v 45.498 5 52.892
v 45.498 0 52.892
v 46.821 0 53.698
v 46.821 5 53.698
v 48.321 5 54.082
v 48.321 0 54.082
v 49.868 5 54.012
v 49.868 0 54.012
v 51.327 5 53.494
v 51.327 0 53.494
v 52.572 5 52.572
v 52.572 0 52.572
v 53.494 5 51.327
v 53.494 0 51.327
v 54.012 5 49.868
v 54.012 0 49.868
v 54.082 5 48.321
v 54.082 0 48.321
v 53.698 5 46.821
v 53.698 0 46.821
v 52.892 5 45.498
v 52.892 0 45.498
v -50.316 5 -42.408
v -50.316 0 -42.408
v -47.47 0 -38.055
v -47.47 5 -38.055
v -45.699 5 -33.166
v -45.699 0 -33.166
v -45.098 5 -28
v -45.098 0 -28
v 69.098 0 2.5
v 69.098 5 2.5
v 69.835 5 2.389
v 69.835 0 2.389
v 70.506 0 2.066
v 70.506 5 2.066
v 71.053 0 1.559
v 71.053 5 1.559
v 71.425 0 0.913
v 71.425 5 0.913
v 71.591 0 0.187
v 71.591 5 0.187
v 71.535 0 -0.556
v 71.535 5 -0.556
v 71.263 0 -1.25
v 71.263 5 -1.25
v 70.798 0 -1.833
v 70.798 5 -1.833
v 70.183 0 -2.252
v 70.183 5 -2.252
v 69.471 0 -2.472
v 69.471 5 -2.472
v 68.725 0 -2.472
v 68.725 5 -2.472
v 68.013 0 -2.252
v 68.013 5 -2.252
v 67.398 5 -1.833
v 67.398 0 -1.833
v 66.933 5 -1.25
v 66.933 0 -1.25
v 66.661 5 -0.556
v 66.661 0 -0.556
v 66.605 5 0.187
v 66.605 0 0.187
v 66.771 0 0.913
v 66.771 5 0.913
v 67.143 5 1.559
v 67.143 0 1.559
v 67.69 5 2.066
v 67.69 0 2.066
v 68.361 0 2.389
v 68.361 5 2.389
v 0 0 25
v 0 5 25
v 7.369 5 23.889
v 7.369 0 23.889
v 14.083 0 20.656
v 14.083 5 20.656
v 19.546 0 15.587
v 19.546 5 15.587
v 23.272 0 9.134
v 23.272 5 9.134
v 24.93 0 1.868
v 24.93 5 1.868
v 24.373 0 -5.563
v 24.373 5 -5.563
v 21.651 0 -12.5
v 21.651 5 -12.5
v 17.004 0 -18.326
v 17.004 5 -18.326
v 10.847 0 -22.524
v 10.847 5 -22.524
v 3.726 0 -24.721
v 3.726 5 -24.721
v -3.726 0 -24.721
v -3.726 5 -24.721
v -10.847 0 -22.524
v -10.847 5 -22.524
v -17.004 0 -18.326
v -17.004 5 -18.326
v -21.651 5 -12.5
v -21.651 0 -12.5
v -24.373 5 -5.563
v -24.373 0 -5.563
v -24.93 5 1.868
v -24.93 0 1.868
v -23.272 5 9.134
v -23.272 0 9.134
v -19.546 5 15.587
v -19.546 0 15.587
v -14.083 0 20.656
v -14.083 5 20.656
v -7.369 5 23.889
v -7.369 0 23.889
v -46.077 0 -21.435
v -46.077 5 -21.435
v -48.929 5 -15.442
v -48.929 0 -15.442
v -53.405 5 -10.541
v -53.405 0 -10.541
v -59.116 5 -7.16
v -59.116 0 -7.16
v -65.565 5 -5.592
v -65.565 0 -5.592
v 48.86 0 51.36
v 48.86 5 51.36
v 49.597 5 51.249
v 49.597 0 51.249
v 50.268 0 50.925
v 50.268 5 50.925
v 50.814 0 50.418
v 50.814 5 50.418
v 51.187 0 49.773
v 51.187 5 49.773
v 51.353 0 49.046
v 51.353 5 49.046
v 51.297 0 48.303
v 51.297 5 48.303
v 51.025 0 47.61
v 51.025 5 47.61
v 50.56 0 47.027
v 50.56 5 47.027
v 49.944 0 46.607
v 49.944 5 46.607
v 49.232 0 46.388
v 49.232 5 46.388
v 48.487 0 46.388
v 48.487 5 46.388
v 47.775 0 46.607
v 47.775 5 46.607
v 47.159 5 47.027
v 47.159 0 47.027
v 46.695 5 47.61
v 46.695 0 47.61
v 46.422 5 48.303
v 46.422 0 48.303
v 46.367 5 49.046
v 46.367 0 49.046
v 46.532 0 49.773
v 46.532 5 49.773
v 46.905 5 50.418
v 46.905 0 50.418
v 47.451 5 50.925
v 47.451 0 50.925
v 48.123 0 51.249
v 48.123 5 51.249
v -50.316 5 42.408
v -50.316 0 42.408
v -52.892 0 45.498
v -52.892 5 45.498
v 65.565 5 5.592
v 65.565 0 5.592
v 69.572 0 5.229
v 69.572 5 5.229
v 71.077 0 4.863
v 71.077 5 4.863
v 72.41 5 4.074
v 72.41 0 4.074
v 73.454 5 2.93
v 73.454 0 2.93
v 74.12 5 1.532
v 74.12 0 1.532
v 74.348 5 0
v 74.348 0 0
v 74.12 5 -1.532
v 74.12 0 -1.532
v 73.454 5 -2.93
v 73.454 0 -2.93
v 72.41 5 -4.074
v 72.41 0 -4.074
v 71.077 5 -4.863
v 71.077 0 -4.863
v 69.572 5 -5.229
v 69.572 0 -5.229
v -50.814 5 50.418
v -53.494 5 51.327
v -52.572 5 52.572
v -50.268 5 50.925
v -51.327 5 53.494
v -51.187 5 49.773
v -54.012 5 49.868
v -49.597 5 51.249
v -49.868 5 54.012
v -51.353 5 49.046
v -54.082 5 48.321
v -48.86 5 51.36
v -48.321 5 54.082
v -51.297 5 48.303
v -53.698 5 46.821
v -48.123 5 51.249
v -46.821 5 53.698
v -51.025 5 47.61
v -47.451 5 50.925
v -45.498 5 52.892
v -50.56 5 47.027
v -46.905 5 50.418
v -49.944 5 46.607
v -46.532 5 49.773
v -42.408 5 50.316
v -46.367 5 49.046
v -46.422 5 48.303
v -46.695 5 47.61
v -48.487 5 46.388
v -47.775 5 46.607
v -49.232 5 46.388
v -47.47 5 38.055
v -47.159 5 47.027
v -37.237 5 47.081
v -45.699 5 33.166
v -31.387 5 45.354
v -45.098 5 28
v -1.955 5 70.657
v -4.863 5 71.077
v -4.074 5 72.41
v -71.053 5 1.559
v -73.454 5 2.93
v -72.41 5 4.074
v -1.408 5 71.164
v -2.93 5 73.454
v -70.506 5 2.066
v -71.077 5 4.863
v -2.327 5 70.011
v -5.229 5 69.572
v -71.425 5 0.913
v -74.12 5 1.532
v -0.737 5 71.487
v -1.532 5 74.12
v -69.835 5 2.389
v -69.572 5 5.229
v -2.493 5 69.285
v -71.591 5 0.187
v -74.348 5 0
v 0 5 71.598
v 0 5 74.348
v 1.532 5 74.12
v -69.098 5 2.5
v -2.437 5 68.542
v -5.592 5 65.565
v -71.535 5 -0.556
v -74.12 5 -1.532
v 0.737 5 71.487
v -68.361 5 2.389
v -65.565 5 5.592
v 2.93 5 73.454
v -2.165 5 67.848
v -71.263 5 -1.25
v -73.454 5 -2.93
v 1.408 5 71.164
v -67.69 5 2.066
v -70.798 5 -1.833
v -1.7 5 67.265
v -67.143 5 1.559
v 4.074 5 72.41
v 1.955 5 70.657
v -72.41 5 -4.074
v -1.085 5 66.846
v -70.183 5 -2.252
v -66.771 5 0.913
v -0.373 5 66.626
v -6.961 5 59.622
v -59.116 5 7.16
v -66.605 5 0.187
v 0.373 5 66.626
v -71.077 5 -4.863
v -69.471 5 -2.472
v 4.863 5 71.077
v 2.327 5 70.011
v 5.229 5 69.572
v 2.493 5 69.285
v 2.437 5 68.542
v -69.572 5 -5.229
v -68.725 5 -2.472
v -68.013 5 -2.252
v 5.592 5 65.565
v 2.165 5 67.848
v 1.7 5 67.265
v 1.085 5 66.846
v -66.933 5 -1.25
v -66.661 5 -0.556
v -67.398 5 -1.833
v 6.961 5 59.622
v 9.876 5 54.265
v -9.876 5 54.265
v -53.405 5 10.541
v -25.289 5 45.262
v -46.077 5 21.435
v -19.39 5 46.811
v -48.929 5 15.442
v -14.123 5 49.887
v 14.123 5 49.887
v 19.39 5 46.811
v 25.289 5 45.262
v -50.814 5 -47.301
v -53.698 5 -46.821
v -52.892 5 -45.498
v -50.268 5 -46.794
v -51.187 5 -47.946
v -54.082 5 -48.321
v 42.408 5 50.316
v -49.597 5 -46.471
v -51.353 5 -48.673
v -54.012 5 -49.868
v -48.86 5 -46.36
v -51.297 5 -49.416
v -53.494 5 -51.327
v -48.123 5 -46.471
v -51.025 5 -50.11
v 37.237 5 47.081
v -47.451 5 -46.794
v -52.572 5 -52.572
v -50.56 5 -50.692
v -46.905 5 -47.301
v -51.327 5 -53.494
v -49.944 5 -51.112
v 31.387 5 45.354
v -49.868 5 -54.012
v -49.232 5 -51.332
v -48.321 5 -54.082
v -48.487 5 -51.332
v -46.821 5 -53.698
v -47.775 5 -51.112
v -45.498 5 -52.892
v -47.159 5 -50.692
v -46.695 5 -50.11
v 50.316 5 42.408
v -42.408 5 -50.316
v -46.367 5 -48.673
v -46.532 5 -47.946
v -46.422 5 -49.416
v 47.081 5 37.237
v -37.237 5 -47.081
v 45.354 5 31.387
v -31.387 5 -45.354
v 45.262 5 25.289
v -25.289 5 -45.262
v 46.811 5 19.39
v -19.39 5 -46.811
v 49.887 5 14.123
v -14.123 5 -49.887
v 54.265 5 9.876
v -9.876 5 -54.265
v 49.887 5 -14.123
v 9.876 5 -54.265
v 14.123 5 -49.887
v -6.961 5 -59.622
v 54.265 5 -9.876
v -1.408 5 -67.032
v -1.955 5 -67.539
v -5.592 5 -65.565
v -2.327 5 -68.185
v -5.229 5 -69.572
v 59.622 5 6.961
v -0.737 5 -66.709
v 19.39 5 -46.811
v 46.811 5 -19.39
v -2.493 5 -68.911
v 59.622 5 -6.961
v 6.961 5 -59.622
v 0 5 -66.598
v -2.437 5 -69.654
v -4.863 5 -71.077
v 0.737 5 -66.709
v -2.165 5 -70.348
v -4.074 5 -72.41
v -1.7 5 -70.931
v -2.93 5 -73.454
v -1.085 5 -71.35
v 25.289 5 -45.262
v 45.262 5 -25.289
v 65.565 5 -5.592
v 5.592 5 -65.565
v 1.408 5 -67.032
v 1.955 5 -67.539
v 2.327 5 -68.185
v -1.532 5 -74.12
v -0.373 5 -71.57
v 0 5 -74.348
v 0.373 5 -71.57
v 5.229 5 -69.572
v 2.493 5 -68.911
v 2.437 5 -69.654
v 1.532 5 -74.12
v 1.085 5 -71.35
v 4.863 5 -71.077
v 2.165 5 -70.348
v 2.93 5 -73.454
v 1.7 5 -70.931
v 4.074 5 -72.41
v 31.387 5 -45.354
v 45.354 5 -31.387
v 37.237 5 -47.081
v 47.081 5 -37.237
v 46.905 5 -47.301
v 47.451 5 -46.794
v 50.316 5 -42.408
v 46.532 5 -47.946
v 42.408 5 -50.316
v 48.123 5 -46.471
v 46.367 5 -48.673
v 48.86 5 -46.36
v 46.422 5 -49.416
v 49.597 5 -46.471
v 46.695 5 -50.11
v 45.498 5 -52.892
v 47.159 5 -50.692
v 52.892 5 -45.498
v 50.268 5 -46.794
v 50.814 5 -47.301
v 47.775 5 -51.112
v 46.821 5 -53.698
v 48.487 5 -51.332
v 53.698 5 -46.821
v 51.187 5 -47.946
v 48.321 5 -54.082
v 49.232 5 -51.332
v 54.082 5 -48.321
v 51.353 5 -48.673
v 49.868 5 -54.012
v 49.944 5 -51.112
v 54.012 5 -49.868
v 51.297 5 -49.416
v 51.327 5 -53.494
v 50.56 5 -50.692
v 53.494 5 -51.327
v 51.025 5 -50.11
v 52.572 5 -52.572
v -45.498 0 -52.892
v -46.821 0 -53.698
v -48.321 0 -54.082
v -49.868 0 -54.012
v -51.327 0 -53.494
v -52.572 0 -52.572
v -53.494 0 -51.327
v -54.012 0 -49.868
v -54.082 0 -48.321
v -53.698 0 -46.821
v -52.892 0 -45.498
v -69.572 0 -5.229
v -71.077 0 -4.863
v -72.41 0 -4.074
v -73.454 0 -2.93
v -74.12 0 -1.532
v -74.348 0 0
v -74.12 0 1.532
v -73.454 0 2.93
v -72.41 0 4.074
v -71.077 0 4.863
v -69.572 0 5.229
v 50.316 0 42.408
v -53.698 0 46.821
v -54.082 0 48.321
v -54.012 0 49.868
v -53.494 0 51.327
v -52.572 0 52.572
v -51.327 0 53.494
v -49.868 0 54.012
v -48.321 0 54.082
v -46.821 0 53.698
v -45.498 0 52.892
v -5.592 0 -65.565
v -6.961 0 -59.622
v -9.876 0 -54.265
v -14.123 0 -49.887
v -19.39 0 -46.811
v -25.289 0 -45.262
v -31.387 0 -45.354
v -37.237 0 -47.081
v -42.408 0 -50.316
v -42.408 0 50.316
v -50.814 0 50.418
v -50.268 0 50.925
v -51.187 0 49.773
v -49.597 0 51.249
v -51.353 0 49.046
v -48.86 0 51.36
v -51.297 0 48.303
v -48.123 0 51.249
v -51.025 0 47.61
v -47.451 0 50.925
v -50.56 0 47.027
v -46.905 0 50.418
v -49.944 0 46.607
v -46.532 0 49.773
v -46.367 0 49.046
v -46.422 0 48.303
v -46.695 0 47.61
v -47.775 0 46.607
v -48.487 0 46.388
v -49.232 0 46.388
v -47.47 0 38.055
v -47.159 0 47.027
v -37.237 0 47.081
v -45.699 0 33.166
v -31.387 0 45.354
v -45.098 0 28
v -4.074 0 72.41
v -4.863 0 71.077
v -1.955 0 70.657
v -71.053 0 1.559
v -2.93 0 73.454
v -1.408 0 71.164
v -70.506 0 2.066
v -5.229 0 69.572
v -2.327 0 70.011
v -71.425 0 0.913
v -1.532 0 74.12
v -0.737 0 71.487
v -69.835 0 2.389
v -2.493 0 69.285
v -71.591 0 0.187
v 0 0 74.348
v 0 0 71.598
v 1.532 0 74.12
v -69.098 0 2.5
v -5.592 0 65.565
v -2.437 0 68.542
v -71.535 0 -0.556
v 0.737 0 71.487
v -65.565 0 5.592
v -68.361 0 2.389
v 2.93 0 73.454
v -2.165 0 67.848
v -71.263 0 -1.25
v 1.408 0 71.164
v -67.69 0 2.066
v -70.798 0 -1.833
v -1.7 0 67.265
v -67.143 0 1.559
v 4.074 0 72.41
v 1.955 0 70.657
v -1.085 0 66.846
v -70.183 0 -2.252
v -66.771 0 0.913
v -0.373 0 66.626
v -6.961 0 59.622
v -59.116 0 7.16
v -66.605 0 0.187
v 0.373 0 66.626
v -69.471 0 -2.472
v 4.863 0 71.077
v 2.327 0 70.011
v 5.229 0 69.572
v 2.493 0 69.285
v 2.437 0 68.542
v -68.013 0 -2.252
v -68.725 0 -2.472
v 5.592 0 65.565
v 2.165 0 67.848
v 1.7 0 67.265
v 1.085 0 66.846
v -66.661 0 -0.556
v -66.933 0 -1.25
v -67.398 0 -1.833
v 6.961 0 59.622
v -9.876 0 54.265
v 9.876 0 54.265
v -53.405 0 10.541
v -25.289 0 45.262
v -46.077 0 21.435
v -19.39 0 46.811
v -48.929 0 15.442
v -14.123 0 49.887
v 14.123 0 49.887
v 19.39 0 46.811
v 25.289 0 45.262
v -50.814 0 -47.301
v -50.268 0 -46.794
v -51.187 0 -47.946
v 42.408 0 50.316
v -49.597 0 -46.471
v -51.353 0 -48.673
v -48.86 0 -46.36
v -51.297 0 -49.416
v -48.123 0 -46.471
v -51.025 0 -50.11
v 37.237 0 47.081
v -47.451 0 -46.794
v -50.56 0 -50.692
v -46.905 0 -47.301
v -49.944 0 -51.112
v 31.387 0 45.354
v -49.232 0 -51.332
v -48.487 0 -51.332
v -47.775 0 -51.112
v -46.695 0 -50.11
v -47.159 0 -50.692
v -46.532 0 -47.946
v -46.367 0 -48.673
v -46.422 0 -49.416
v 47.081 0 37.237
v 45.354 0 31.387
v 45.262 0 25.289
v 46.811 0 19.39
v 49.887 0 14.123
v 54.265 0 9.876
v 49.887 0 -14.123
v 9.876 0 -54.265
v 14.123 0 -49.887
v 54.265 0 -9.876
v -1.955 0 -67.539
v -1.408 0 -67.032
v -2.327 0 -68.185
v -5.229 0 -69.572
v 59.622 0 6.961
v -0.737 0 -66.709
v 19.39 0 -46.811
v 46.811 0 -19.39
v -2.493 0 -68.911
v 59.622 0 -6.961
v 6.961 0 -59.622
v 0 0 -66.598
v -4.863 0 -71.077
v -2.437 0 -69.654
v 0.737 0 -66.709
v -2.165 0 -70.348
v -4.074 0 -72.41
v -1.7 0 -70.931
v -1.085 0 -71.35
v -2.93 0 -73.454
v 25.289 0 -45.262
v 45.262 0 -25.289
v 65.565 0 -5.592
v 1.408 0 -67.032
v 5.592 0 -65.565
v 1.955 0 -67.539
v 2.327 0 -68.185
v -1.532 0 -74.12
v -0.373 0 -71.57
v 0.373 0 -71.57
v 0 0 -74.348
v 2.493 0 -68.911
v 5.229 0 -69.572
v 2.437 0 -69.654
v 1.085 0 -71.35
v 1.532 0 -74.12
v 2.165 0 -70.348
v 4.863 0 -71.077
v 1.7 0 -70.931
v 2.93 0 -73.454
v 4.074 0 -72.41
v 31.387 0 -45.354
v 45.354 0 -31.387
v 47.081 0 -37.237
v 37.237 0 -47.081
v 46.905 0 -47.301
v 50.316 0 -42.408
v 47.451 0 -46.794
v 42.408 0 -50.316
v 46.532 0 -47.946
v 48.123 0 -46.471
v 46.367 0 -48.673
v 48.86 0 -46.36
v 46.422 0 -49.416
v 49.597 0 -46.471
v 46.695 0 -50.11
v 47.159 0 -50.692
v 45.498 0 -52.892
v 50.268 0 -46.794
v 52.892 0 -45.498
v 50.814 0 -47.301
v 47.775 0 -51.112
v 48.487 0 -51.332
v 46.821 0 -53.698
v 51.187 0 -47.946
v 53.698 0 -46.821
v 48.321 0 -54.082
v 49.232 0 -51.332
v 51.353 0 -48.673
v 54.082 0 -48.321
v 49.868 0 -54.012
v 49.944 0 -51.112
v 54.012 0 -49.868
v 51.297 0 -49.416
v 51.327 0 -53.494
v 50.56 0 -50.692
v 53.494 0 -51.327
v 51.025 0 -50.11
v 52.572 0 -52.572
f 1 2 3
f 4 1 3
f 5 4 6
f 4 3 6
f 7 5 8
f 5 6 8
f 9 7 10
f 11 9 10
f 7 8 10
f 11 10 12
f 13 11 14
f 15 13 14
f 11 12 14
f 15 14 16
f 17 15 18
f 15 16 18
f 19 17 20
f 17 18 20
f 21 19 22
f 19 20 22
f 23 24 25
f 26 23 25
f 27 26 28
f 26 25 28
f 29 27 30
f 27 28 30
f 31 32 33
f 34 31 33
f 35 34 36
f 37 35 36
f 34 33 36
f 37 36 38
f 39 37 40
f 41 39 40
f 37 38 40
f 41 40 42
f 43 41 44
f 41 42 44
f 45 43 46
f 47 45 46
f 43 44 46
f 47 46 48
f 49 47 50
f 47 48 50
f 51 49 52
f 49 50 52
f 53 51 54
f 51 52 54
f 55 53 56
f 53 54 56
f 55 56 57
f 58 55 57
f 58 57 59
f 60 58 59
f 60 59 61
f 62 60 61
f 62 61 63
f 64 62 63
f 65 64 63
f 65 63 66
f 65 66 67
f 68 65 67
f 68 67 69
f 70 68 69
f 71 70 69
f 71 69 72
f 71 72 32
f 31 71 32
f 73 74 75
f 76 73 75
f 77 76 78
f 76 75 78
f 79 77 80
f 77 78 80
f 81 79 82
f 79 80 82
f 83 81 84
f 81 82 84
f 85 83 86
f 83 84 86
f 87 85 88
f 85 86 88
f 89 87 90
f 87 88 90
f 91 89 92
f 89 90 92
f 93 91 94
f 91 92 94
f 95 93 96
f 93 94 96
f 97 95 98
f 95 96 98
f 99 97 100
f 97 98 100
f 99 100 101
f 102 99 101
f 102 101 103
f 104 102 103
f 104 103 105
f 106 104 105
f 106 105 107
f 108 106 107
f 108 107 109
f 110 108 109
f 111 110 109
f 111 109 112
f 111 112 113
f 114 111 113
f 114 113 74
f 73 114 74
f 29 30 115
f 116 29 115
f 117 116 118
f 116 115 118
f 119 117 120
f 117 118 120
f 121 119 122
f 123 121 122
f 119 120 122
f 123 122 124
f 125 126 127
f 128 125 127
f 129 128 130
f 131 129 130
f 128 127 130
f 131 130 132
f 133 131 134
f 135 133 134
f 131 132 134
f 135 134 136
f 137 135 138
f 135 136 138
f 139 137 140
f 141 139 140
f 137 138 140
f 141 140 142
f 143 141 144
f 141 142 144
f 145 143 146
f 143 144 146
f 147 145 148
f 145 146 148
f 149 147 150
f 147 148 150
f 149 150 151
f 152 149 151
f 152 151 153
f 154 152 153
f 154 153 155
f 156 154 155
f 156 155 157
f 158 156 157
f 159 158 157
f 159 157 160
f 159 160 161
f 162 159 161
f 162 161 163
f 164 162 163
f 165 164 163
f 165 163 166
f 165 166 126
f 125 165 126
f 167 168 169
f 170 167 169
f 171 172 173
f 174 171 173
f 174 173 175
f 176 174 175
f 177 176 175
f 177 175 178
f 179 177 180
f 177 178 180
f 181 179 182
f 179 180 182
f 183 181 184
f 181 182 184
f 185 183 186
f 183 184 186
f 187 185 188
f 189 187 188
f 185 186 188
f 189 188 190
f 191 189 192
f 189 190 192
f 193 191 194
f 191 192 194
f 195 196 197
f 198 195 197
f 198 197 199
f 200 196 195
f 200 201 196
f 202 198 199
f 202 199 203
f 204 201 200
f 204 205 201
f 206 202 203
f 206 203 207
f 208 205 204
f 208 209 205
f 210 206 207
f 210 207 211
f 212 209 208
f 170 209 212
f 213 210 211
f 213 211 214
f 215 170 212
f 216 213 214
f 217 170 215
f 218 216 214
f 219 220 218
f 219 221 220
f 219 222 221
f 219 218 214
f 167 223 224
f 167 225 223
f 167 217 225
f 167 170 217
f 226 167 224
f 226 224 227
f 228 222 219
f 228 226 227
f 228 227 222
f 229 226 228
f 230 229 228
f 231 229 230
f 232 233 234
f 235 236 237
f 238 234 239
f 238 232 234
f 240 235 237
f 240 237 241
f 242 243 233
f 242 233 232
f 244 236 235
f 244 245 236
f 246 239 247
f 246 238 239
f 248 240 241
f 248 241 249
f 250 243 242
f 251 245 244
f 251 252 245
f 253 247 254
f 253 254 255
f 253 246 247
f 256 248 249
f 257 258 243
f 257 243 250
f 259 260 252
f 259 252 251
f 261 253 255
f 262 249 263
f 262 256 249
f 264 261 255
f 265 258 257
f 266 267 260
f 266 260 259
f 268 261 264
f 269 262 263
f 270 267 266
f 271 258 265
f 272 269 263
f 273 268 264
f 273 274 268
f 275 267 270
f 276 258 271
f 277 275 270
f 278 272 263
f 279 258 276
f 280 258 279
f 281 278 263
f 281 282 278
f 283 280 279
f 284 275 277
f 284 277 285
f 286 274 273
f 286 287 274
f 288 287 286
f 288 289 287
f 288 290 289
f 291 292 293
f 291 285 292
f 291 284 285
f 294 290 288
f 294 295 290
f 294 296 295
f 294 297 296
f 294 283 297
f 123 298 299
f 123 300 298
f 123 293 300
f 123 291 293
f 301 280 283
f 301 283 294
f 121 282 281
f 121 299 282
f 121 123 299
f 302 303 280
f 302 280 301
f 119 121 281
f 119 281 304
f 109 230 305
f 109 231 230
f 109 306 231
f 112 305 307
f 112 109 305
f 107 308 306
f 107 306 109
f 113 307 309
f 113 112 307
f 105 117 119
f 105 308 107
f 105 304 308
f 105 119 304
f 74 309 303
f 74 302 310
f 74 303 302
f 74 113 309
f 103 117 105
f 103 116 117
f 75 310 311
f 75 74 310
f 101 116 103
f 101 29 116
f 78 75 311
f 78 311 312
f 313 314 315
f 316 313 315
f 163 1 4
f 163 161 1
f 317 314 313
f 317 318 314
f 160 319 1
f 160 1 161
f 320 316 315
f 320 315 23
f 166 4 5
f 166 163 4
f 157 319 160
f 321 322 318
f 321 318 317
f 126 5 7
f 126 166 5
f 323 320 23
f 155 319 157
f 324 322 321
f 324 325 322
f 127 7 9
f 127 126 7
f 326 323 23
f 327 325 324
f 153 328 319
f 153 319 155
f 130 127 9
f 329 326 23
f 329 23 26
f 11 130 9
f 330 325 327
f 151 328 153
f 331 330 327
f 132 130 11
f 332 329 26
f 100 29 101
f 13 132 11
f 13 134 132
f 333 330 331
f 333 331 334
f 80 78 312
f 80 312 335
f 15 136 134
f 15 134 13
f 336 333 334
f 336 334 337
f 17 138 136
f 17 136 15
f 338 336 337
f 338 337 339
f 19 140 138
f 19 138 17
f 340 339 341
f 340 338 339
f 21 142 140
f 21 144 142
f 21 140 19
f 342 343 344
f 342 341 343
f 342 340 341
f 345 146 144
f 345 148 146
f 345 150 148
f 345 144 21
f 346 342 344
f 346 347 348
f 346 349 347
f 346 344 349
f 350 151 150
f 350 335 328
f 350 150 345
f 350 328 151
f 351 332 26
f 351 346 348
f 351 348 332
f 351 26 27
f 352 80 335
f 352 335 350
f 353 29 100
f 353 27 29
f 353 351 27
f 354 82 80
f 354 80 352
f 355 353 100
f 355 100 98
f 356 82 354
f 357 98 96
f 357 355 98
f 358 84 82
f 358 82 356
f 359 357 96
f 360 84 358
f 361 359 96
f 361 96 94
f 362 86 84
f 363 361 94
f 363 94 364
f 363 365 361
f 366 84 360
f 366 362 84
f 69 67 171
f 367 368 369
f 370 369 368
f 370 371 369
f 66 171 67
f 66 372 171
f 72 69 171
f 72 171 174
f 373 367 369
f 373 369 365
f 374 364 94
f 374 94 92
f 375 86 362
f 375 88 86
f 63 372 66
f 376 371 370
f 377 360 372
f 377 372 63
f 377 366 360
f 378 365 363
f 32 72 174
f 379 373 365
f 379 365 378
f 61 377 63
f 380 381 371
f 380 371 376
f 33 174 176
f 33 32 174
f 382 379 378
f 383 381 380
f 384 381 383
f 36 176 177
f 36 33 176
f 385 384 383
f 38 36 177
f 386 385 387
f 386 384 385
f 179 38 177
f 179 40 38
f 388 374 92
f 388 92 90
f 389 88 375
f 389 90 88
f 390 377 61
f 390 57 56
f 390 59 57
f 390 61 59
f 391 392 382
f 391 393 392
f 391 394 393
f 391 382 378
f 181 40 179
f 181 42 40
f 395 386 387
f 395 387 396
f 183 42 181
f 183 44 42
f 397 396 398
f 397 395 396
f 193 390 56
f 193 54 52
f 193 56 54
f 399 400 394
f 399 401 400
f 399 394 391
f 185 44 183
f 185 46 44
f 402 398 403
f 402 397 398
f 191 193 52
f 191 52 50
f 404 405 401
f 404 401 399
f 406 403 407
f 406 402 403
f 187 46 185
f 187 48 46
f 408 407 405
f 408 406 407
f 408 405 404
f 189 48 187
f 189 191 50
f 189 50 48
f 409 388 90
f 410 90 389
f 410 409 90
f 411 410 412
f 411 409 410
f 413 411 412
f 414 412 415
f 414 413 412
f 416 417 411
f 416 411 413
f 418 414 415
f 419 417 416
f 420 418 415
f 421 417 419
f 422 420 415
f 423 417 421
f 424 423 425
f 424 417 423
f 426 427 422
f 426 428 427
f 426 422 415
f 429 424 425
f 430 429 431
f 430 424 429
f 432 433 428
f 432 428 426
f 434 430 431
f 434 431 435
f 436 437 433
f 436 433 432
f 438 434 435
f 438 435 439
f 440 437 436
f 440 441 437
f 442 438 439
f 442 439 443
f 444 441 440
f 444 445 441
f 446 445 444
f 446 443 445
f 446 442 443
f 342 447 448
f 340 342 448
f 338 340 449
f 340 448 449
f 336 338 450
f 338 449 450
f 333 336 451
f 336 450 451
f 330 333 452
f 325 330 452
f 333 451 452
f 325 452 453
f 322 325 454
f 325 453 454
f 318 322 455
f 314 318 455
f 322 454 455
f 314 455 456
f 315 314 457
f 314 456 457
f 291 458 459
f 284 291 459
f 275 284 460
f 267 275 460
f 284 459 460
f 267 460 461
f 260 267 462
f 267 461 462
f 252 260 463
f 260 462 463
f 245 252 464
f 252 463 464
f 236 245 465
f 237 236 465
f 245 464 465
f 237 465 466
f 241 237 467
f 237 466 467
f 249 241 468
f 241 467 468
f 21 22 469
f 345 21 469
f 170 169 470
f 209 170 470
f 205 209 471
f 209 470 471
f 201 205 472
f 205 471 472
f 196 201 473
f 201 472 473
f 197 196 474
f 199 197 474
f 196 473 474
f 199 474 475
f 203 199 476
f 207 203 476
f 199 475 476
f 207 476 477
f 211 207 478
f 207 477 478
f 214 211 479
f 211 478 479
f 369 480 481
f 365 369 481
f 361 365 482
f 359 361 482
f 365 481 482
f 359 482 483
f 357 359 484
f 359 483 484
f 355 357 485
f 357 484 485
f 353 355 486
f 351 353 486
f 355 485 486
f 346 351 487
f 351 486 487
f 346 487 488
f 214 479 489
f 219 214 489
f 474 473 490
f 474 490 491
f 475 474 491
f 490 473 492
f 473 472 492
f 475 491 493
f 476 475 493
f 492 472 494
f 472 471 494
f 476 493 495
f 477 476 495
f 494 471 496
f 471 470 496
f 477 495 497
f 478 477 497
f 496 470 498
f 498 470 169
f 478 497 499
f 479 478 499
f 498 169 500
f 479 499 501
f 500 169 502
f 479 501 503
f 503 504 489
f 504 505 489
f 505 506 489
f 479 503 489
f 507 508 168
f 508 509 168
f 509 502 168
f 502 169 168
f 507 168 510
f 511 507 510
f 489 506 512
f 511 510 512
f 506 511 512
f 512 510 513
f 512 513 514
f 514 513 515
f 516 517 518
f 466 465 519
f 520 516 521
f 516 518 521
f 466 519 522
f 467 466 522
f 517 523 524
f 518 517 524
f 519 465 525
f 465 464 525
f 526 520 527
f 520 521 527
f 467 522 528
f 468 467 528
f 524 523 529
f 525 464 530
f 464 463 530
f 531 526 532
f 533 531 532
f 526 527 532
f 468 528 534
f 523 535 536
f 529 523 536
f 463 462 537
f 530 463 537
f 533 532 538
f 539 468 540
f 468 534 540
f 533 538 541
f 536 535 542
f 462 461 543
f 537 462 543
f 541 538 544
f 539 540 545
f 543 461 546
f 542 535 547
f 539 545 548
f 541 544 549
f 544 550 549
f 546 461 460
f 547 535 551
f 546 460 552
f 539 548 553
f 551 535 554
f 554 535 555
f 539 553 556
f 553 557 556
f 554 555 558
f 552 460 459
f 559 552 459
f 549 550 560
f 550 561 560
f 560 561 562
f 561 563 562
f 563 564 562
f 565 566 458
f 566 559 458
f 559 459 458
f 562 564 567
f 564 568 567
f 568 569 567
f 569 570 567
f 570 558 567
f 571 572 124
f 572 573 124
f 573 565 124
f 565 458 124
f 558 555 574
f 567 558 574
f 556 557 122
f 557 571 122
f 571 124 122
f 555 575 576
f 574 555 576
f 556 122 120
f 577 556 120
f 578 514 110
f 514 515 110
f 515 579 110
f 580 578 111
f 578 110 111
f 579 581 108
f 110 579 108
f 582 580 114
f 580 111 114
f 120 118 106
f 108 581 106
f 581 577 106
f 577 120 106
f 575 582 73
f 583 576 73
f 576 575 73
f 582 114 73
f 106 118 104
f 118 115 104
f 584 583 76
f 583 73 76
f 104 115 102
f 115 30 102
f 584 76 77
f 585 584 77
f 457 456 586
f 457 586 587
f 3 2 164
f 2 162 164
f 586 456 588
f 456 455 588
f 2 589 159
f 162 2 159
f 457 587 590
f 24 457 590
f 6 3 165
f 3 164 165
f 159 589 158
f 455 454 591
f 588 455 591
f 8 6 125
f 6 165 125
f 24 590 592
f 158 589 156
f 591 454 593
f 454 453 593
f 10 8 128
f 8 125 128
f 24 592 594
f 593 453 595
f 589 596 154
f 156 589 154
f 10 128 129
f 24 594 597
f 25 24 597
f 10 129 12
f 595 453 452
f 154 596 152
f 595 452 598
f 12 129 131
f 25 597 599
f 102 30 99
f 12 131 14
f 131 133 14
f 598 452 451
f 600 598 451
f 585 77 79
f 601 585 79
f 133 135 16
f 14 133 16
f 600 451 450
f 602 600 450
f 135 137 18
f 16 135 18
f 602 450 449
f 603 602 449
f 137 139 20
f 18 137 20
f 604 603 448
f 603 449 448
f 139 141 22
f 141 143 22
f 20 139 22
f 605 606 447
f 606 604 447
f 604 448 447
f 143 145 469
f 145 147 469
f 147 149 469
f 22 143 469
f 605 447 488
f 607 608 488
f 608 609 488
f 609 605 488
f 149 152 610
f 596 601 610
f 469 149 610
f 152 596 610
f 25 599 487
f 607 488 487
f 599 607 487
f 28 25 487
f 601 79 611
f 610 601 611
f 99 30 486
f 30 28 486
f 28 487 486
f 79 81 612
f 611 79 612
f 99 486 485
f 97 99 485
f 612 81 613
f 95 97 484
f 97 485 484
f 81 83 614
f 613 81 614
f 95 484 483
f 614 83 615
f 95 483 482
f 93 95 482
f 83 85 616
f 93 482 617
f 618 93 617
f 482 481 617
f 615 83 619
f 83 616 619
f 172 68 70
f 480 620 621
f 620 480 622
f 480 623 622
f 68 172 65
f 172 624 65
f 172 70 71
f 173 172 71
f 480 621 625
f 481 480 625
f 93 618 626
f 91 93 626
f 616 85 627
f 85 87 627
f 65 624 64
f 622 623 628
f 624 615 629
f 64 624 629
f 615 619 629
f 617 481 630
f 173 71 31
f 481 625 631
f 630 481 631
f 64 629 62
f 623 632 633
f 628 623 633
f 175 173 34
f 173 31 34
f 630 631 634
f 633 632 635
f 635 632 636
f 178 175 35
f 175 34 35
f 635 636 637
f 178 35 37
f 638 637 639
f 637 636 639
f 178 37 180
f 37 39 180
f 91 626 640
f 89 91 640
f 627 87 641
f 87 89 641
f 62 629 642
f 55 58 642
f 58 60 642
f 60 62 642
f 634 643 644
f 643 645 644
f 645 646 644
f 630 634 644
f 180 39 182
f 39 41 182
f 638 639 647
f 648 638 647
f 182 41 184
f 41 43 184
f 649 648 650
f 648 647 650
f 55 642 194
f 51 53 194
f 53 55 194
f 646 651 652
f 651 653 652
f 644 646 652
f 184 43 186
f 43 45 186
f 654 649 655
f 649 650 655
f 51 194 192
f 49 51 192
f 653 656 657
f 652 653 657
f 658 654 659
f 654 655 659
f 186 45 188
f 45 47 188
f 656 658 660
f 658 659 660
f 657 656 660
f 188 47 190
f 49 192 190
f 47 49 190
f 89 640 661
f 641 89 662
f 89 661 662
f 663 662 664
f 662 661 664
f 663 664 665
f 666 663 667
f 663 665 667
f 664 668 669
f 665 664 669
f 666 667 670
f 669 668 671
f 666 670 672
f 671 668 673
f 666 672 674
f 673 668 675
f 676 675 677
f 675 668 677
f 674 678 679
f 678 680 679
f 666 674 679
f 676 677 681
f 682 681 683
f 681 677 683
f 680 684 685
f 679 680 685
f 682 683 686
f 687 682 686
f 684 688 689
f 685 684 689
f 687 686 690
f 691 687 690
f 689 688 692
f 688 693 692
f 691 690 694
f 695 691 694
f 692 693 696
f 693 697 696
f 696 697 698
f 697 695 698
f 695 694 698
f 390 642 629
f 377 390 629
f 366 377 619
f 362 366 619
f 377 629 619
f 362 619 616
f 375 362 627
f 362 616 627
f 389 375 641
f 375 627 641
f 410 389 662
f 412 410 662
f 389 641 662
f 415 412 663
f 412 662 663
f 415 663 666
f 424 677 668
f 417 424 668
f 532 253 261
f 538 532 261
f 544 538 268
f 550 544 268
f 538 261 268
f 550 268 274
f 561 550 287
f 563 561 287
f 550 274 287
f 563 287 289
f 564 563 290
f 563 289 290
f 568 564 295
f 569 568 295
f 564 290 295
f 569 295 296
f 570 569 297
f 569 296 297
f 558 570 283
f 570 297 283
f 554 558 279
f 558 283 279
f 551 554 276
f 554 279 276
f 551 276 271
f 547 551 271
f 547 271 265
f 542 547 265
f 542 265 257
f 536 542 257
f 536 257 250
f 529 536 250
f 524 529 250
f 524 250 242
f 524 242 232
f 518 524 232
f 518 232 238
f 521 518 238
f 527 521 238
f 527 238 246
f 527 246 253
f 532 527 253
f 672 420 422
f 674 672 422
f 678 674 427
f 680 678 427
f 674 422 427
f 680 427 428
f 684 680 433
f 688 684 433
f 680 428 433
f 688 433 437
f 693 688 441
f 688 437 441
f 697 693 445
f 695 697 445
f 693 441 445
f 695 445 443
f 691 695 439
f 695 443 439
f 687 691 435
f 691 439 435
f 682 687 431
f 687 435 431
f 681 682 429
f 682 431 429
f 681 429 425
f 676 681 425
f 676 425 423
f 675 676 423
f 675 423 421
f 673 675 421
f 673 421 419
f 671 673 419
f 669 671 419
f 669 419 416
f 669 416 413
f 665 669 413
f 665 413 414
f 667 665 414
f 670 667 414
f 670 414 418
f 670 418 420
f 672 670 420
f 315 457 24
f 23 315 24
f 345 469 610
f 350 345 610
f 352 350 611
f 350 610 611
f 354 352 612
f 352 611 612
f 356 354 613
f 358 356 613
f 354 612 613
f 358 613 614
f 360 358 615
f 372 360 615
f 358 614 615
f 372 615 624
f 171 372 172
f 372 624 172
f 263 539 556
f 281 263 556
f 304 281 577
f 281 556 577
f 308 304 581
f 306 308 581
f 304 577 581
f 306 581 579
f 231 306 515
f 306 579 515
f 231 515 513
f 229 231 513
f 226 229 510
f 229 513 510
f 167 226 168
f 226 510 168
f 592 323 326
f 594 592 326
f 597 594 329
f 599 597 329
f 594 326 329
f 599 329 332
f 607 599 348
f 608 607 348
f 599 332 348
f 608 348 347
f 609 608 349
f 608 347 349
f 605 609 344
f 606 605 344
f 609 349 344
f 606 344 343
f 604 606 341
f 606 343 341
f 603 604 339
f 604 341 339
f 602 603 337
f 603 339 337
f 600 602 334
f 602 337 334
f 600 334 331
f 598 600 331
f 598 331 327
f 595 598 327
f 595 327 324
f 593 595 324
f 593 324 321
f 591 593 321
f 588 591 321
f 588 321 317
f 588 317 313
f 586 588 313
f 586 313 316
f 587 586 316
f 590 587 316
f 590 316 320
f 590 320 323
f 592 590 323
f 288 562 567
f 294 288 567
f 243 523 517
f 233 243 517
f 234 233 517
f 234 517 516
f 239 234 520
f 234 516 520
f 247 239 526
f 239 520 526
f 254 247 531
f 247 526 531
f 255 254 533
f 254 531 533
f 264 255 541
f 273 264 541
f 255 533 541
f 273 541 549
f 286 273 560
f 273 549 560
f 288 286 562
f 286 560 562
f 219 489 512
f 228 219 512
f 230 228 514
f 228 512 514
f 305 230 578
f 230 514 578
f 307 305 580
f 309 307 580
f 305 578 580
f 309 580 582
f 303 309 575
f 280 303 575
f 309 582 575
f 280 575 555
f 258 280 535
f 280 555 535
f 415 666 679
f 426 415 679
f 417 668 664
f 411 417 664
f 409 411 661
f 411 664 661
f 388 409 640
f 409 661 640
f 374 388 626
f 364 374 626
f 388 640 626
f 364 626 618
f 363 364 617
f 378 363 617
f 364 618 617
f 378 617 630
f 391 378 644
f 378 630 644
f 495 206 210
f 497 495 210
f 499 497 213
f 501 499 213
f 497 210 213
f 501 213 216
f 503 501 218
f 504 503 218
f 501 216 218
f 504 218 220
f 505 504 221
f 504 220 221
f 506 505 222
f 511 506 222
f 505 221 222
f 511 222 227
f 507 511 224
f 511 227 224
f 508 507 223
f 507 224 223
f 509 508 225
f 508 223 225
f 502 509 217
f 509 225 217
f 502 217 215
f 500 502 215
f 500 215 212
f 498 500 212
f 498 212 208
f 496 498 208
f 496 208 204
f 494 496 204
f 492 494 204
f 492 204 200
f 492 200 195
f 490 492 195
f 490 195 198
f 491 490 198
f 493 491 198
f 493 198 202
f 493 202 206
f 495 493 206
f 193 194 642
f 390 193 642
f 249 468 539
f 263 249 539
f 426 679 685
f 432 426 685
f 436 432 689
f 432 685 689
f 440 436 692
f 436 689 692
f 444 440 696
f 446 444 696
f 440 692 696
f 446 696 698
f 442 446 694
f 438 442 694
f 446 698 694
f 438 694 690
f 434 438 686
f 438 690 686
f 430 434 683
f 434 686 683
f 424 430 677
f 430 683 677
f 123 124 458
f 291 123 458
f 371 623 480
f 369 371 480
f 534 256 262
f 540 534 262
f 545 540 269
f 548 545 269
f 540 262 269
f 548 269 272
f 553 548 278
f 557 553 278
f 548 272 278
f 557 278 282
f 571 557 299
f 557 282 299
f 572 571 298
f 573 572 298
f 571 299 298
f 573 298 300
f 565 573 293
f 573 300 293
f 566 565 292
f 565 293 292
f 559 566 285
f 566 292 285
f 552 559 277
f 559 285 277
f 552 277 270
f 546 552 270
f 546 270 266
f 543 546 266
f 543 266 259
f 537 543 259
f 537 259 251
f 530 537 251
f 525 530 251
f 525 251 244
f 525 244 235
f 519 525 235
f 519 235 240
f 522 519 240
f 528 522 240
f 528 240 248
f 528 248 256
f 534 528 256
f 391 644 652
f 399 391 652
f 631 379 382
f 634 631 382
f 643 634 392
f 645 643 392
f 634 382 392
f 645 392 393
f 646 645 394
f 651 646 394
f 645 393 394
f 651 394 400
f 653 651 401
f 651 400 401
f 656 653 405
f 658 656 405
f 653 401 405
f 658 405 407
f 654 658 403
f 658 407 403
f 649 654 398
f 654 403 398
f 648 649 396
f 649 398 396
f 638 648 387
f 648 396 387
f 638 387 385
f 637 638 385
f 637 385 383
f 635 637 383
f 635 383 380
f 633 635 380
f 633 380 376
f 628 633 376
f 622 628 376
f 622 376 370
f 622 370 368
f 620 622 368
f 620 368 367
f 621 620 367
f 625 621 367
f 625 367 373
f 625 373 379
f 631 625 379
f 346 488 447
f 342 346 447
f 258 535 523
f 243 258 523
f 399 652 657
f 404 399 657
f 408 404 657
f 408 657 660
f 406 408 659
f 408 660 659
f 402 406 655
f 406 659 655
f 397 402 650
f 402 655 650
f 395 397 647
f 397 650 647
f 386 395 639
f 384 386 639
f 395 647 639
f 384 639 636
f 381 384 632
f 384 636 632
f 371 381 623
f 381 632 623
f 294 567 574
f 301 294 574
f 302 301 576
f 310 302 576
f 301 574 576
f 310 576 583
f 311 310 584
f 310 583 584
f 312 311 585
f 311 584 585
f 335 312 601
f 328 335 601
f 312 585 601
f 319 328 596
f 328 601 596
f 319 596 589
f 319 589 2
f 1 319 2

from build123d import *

# Parameters (mm, degrees)
SKETCH1_R           = 5.25
BOSS_EXTRUDE1_DEPTH = 5
SKETCH2_R           = 2.5
CUT_EXTRUDE1_DEPTH  = 10
SKETCH3_R           = 25
CUT_EXTRUDE2_DEPTH  = 10


with BuildPart() as part:
    # Sketch1 → Boss-Extrude1 (new body)
    with BuildSketch(Plane(origin=(0, 0, 0), x_dir=(1, 0, 0), z_dir=(0, 1, 0))):
        with BuildLine():
            ThreePointArc((69.572261498, -5.228532951), (63.847979746, 0), (69.572261498, 5.228532951))
            Line((69.572261498, 5.228532951), (65.565343666, 5.592001639))
            ThreePointArc((65.565343666, 5.592001639), (46.810690265, 19.389622772), (50.315841396, 42.407556838))
            Line((50.315841396, 42.407556838), (52.892148993, 45.497886783))
            ThreePointArc((52.892148993, 45.497886783), (45.147339444, 45.147339444), (45.497886783, 52.892148993))
            Line((45.497886783, 52.892148993), (42.407556838, 50.315841396))
            ThreePointArc((42.407556838, 50.315841396), (19.389622772, 46.810690265), (5.592001639, 65.565343666))
            Line((5.592001639, 65.565343666), (5.228532951, 69.572261498))
            ThreePointArc((5.228532951, 69.572261498), (5.244630492, 69.33536341), (5.25, 69.097979746))
            ThreePointArc((5.25, 69.097979746), (-0.237383663, 63.853349255), (-5.228532951, 69.572261498))
            Line((-5.228532951, 69.572261498), (-5.592001639, 65.565343666))
            ThreePointArc((-5.592001639, 65.565343666), (-19.389622772, 46.810690265), (-42.407556838, 50.315841396))
            Line((-42.407556838, 50.315841396), (-45.497886783, 52.892148993))
            ThreePointArc((-45.497886783, 52.892148993), (-44.105086073, 51.085997151), (-43.609650045, 48.859650045))
            ThreePointArc((-43.609650045, 48.859650045), (-47.071930755, 43.923400483), (-52.892148993, 45.497886783))
            Line((-52.892148993, 45.497886783), (-50.315841396, 42.407556838))
            ThreePointArc((-50.315841396, 42.407556838), (-46.44262448, 35.661654101), (-45.097979746, 28))
            ThreePointArc((-45.097979746, 28), (-50.984968102, 12.825750625), (-65.565343666, 5.592001639))
            Line((-65.565343666, 5.592001639), (-69.572261498, 5.228532951))
            ThreePointArc((-69.572261498, 5.228532951), (-65.557321559, 3.876369384), (-63.847979746, 0))
            ThreePointArc((-63.847979746, 0), (-65.557321559, -3.876369384), (-69.572261498, -5.228532951))
            Line((-69.572261498, -5.228532951), (-65.565343666, -5.592001639))
            ThreePointArc((-65.565343666, -5.592001639), (-50.984968102, -12.825750625), (-45.097979746, -28))
            ThreePointArc((-45.097979746, -28), (-46.44262448, -35.661654101), (-50.315841396, -42.407556838))
            Line((-50.315841396, -42.407556838), (-52.892148993, -45.497886783))
            ThreePointArc((-52.892148993, -45.497886783), (-47.071930755, -43.923400483), (-43.609650045, -48.859650045))
            ThreePointArc((-43.609650045, -48.859650045), (-44.105086073, -51.085997151), (-45.497886783, -52.892148993))
            Line((-45.497886783, -52.892148993), (-42.407556838, -50.315841396))
            ThreePointArc((-42.407556838, -50.315841396), (-19.389622772, -46.810690265), (-5.592001639, -65.565343666))
            Line((-5.592001639, -65.565343666), (-5.228532951, -69.572261498))
            ThreePointArc((-5.228532951, -69.572261498), (-0.237383663, -63.853349255), (5.25, -69.097979746))
            ThreePointArc((5.25, -69.097979746), (5.244630492, -69.33536341), (5.228532951, -69.572261498))
            Line((5.228532951, -69.572261498), (5.592001639, -65.565343666))
            ThreePointArc((5.592001639, -65.565343666), (19.389622772, -46.810690265), (42.407556838, -50.315841396))
            Line((42.407556838, -50.315841396), (45.497886783, -52.892148993))
            ThreePointArc((45.497886783, -52.892148993), (45.147339444, -45.147339444), (52.892148993, -45.497886783))
            Line((52.892148993, -45.497886783), (50.315841396, -42.407556838))
            ThreePointArc((50.315841396, -42.407556838), (46.810690265, -19.389622772), (65.565343666, -5.592001639))
            Line((65.565343666, -5.592001639), (69.572261498, -5.228532951))
        make_face()
        with Locations((0, -69.097979746)):
            Circle(SKETCH1_R)
        with Locations((48.859650045, -48.859650045)):
            Circle(SKETCH1_R)
        with Locations((69.097979746, 0)):
            Circle(SKETCH1_R)
        with Locations((48.859650045, 48.859650045)):
            Circle(SKETCH1_R)
        with Locations((-48.859650045, -48.859650045)):
            Circle(SKETCH1_R)
        with Locations((-69.097979746, 0)):
            Circle(SKETCH1_R)
        with Locations((-48.859650045, 48.859650045)):
            Circle(SKETCH1_R)
        with Locations((0, 69.097979746)):
            Circle(SKETCH1_R)
    extrude(amount=BOSS_EXTRUDE1_DEPTH)

    # Sketch2 → Cut-Extrude1 (cut)
    with BuildSketch(Plane(origin=(0, 5, 0), x_dir=(1, 0, 0), z_dir=(0, 1, 0))):
        with Locations(Location((69.097979746, 0, 0), (0, 0, 270))):
            Circle(SKETCH2_R)
        with Locations(Location((48.859650045, -48.859650045, 0), (0, 0, 270))):
            Circle(SKETCH2_R)
        with Locations(Location((0, -69.097979746, 0), (0, 0, 270))):
            Circle(SKETCH2_R)
        with Locations(Location((-48.859650045, -48.859650045, 0), (0, 0, 270))):
            Circle(SKETCH2_R)
        with Locations(Location((-69.097979746, 0, 0), (0, 0, 270))):
            Circle(SKETCH2_R)
        with Locations(Location((-48.859650045, 48.859650045, 0), (0, 0, 270))):
            Circle(SKETCH2_R)
        with Locations(Location((0, 69.097979746, 0), (0, 0, 270))):
            Circle(SKETCH2_R)
        with Locations(Location((48.859650045, 48.859650045, 0), (0, 0, 270))):
            Circle(SKETCH2_R)
    extrude(amount=-CUT_EXTRUDE1_DEPTH, mode=Mode.SUBTRACT)

    # Sketch3 → Cut-Extrude2 (cut)
    with BuildSketch(Plane(origin=(0, 5, 0), x_dir=(1, 0, 0), z_dir=(0, 1, 0))):
        with Locations(Location((0, 0, 0), (0, 0, 270))):
            Circle(SKETCH3_R)
    extrude(amount=-CUT_EXTRUDE2_DEPTH, mode=Mode.SUBTRACT)


solid = part.part
